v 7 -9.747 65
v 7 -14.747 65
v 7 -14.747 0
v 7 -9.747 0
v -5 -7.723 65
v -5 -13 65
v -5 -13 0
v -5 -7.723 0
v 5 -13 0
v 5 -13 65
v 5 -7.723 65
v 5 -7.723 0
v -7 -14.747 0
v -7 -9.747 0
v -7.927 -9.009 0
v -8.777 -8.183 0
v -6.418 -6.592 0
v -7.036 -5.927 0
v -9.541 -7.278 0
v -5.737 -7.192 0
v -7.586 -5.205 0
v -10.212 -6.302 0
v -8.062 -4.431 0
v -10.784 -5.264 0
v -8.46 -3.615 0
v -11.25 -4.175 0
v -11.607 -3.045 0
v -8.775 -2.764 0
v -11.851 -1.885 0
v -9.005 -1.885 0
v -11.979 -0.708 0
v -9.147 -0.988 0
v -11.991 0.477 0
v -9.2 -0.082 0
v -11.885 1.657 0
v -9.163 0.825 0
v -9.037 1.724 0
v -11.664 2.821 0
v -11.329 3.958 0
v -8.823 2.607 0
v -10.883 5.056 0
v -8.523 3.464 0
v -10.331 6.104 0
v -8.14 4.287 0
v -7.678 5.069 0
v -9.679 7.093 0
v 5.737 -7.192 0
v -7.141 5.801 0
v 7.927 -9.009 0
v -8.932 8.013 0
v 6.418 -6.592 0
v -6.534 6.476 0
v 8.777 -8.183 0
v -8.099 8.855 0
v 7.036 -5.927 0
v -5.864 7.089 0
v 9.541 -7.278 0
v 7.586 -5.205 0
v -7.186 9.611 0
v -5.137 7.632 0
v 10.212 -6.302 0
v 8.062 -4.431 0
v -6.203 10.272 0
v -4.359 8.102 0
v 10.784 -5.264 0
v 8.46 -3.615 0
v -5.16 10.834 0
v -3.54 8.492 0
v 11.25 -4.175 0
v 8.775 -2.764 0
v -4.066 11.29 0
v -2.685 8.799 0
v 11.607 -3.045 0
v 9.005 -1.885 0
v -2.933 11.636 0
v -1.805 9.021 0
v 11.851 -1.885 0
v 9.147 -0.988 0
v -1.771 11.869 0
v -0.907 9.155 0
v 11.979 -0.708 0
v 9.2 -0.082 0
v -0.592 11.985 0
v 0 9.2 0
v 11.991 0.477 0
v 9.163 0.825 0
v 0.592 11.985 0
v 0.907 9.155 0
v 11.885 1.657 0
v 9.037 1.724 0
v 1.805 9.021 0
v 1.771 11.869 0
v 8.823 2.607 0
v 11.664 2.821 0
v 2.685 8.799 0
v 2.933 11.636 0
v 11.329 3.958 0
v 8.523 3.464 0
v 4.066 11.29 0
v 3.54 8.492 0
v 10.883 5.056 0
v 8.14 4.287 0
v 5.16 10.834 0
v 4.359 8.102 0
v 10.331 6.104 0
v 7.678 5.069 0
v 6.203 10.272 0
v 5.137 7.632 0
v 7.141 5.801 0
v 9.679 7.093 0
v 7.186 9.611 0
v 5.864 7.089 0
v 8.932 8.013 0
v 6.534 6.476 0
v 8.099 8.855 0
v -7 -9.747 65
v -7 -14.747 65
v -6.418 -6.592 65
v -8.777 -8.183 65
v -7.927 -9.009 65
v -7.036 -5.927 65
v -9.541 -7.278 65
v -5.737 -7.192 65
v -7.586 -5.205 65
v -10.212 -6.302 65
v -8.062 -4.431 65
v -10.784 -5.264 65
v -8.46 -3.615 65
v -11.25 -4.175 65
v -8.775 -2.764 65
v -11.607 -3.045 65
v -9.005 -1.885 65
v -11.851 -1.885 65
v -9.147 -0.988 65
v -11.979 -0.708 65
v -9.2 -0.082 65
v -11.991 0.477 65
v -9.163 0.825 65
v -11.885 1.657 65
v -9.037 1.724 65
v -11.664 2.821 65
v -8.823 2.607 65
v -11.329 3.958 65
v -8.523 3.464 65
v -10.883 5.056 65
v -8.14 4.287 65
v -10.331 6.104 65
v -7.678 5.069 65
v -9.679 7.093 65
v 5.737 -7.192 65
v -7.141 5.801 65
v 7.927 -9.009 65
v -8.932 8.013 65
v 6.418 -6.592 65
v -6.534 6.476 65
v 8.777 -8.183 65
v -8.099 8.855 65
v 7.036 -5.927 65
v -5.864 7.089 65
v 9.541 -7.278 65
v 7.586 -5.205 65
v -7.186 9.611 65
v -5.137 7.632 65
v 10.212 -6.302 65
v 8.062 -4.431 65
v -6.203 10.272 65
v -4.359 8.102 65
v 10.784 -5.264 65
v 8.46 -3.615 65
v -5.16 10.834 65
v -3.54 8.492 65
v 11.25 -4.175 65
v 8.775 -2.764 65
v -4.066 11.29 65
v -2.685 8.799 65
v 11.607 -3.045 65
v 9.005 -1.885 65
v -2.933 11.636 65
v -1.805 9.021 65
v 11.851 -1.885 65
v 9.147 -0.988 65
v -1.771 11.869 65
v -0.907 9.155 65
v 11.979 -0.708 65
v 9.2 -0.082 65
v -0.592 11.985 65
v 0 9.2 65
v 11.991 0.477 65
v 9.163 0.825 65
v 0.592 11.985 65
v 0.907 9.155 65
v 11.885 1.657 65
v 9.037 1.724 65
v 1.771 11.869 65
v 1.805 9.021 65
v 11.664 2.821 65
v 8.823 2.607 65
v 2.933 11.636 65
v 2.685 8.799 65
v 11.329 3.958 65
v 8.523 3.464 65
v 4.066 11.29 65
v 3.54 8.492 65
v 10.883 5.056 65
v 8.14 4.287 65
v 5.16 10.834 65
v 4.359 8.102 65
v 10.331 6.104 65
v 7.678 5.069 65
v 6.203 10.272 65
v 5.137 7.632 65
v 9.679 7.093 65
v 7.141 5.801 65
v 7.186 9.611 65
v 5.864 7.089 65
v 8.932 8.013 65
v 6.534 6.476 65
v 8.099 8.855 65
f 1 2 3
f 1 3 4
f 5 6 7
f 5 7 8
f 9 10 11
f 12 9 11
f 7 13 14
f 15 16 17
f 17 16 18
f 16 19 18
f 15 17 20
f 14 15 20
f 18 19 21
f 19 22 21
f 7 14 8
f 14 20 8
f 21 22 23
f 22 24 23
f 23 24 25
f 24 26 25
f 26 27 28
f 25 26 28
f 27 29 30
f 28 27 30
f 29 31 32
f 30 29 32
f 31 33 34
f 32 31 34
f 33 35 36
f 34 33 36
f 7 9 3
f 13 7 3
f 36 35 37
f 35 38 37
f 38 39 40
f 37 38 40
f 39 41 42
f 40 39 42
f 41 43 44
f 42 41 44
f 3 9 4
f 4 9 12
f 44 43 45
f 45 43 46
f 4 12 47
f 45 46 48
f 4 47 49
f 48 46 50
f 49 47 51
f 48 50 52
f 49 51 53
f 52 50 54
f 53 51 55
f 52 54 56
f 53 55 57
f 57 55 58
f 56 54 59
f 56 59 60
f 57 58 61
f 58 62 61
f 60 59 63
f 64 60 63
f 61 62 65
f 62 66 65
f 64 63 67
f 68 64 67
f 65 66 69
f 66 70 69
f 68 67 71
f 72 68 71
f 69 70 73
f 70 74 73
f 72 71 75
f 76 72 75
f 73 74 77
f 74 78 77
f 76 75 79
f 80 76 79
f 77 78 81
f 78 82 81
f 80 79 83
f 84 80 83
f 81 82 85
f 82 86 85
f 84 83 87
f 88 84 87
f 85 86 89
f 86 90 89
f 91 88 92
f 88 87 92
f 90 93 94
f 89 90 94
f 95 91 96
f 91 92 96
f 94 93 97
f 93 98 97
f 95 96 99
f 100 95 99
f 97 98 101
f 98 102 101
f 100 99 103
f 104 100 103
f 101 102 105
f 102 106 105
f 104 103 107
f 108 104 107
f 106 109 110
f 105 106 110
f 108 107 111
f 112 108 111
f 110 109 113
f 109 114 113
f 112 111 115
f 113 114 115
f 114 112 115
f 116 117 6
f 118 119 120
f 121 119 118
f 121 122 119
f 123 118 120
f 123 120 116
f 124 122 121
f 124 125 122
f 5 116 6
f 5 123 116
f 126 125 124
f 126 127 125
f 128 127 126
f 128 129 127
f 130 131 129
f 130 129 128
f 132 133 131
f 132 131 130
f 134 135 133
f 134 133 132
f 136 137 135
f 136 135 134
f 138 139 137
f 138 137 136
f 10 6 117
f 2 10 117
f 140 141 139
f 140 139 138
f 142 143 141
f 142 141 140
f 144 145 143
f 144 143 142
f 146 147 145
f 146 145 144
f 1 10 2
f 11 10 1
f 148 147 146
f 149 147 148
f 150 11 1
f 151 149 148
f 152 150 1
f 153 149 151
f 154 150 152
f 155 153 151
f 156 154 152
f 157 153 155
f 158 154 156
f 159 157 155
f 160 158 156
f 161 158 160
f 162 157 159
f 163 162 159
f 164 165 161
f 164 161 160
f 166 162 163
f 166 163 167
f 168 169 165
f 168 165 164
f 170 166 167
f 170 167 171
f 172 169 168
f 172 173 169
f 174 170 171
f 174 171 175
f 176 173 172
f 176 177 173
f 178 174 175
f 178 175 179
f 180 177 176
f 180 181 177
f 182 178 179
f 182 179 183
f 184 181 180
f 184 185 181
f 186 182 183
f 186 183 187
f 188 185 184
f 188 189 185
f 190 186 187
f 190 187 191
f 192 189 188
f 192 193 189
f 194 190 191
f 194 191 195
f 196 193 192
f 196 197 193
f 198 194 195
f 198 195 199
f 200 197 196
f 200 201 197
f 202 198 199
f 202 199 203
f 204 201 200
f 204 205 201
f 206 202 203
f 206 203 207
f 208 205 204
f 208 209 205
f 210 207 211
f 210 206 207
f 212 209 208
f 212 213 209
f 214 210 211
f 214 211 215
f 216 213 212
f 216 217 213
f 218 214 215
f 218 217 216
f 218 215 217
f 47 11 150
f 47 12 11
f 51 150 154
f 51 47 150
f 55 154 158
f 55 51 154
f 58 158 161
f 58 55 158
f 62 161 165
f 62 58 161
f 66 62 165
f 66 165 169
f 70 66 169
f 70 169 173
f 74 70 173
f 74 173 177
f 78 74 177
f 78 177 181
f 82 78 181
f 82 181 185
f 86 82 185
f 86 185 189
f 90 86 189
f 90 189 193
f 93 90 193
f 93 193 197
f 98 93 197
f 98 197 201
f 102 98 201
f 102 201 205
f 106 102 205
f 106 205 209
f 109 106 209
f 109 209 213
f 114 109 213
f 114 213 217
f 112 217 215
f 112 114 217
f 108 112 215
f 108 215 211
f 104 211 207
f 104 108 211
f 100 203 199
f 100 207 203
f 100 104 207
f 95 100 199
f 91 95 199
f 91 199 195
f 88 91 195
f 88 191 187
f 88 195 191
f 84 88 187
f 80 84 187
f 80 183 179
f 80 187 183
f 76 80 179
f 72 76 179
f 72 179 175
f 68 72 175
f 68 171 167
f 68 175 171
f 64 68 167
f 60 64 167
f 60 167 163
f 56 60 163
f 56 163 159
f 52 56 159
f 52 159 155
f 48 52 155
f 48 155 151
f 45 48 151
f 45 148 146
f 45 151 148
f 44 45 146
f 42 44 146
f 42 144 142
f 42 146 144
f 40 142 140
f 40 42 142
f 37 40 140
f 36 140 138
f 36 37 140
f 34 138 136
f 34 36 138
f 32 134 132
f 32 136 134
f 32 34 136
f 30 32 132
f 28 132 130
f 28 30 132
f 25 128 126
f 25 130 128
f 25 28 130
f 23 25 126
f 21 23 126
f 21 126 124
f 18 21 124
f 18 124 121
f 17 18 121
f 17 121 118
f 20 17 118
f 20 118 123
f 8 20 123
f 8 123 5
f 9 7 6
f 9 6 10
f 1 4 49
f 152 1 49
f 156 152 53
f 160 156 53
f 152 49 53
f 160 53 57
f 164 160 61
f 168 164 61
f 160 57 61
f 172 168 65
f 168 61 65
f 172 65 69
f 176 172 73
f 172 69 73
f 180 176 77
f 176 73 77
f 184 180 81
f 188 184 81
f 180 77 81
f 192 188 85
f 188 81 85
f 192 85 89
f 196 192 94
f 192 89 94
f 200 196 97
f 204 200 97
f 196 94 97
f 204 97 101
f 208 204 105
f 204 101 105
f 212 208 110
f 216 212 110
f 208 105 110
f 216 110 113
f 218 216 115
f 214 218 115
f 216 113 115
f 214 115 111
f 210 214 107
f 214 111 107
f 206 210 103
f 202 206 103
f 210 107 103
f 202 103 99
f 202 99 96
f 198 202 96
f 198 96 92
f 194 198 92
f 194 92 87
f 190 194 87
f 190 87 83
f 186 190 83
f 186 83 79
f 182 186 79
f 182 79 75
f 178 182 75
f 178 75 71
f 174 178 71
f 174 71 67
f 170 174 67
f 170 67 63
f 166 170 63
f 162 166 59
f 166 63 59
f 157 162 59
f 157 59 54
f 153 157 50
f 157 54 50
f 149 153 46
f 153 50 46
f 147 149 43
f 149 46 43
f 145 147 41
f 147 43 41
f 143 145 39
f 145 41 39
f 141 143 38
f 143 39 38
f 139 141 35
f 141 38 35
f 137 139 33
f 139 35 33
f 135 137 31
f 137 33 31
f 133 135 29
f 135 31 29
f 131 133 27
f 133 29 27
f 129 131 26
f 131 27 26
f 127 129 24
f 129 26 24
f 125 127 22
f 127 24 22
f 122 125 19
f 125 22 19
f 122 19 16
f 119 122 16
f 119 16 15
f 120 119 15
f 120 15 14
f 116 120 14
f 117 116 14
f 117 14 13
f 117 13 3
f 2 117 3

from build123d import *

# Parameters (mm, degrees)
SKETCH1_R           = 9.2
BOSS_EXTRUDE1_DEPTH = 65
SKETCH2_W           = 10
SKETCH2_H           = 12.398416249
CUT_EXTRUDE3_DEPTH  = 68.723466712


with BuildPart() as part:
    # Sketch1 → Boss-Extrude1 (new body)
    with BuildSketch(Plane.XY):
        with BuildLine():
            Line((-7, -9.746794345), (-7, -14.746794345))
            Line((-7, -14.746794345), (7, -14.746794345))
            Line((7, -14.746794345), (7, -9.746794345))
            ThreePointArc((7, -9.746794345), (0, 12), (-7, -9.746794345))
        make_face()
        Circle(SKETCH1_R, mode=Mode.SUBTRACT)
    extrude(amount=BOSS_EXTRUDE1_DEPTH)

    # Sketch2 → Cut-Extrude3 (cut, through all)
    with BuildSketch(Plane.XY):
        with Locations((0, -6.800791875)):
            Rectangle(SKETCH2_W, SKETCH2_H)
    extrude(amount=CUT_EXTRUDE3_DEPTH, mode=Mode.SUBTRACT)


solid = part.part
